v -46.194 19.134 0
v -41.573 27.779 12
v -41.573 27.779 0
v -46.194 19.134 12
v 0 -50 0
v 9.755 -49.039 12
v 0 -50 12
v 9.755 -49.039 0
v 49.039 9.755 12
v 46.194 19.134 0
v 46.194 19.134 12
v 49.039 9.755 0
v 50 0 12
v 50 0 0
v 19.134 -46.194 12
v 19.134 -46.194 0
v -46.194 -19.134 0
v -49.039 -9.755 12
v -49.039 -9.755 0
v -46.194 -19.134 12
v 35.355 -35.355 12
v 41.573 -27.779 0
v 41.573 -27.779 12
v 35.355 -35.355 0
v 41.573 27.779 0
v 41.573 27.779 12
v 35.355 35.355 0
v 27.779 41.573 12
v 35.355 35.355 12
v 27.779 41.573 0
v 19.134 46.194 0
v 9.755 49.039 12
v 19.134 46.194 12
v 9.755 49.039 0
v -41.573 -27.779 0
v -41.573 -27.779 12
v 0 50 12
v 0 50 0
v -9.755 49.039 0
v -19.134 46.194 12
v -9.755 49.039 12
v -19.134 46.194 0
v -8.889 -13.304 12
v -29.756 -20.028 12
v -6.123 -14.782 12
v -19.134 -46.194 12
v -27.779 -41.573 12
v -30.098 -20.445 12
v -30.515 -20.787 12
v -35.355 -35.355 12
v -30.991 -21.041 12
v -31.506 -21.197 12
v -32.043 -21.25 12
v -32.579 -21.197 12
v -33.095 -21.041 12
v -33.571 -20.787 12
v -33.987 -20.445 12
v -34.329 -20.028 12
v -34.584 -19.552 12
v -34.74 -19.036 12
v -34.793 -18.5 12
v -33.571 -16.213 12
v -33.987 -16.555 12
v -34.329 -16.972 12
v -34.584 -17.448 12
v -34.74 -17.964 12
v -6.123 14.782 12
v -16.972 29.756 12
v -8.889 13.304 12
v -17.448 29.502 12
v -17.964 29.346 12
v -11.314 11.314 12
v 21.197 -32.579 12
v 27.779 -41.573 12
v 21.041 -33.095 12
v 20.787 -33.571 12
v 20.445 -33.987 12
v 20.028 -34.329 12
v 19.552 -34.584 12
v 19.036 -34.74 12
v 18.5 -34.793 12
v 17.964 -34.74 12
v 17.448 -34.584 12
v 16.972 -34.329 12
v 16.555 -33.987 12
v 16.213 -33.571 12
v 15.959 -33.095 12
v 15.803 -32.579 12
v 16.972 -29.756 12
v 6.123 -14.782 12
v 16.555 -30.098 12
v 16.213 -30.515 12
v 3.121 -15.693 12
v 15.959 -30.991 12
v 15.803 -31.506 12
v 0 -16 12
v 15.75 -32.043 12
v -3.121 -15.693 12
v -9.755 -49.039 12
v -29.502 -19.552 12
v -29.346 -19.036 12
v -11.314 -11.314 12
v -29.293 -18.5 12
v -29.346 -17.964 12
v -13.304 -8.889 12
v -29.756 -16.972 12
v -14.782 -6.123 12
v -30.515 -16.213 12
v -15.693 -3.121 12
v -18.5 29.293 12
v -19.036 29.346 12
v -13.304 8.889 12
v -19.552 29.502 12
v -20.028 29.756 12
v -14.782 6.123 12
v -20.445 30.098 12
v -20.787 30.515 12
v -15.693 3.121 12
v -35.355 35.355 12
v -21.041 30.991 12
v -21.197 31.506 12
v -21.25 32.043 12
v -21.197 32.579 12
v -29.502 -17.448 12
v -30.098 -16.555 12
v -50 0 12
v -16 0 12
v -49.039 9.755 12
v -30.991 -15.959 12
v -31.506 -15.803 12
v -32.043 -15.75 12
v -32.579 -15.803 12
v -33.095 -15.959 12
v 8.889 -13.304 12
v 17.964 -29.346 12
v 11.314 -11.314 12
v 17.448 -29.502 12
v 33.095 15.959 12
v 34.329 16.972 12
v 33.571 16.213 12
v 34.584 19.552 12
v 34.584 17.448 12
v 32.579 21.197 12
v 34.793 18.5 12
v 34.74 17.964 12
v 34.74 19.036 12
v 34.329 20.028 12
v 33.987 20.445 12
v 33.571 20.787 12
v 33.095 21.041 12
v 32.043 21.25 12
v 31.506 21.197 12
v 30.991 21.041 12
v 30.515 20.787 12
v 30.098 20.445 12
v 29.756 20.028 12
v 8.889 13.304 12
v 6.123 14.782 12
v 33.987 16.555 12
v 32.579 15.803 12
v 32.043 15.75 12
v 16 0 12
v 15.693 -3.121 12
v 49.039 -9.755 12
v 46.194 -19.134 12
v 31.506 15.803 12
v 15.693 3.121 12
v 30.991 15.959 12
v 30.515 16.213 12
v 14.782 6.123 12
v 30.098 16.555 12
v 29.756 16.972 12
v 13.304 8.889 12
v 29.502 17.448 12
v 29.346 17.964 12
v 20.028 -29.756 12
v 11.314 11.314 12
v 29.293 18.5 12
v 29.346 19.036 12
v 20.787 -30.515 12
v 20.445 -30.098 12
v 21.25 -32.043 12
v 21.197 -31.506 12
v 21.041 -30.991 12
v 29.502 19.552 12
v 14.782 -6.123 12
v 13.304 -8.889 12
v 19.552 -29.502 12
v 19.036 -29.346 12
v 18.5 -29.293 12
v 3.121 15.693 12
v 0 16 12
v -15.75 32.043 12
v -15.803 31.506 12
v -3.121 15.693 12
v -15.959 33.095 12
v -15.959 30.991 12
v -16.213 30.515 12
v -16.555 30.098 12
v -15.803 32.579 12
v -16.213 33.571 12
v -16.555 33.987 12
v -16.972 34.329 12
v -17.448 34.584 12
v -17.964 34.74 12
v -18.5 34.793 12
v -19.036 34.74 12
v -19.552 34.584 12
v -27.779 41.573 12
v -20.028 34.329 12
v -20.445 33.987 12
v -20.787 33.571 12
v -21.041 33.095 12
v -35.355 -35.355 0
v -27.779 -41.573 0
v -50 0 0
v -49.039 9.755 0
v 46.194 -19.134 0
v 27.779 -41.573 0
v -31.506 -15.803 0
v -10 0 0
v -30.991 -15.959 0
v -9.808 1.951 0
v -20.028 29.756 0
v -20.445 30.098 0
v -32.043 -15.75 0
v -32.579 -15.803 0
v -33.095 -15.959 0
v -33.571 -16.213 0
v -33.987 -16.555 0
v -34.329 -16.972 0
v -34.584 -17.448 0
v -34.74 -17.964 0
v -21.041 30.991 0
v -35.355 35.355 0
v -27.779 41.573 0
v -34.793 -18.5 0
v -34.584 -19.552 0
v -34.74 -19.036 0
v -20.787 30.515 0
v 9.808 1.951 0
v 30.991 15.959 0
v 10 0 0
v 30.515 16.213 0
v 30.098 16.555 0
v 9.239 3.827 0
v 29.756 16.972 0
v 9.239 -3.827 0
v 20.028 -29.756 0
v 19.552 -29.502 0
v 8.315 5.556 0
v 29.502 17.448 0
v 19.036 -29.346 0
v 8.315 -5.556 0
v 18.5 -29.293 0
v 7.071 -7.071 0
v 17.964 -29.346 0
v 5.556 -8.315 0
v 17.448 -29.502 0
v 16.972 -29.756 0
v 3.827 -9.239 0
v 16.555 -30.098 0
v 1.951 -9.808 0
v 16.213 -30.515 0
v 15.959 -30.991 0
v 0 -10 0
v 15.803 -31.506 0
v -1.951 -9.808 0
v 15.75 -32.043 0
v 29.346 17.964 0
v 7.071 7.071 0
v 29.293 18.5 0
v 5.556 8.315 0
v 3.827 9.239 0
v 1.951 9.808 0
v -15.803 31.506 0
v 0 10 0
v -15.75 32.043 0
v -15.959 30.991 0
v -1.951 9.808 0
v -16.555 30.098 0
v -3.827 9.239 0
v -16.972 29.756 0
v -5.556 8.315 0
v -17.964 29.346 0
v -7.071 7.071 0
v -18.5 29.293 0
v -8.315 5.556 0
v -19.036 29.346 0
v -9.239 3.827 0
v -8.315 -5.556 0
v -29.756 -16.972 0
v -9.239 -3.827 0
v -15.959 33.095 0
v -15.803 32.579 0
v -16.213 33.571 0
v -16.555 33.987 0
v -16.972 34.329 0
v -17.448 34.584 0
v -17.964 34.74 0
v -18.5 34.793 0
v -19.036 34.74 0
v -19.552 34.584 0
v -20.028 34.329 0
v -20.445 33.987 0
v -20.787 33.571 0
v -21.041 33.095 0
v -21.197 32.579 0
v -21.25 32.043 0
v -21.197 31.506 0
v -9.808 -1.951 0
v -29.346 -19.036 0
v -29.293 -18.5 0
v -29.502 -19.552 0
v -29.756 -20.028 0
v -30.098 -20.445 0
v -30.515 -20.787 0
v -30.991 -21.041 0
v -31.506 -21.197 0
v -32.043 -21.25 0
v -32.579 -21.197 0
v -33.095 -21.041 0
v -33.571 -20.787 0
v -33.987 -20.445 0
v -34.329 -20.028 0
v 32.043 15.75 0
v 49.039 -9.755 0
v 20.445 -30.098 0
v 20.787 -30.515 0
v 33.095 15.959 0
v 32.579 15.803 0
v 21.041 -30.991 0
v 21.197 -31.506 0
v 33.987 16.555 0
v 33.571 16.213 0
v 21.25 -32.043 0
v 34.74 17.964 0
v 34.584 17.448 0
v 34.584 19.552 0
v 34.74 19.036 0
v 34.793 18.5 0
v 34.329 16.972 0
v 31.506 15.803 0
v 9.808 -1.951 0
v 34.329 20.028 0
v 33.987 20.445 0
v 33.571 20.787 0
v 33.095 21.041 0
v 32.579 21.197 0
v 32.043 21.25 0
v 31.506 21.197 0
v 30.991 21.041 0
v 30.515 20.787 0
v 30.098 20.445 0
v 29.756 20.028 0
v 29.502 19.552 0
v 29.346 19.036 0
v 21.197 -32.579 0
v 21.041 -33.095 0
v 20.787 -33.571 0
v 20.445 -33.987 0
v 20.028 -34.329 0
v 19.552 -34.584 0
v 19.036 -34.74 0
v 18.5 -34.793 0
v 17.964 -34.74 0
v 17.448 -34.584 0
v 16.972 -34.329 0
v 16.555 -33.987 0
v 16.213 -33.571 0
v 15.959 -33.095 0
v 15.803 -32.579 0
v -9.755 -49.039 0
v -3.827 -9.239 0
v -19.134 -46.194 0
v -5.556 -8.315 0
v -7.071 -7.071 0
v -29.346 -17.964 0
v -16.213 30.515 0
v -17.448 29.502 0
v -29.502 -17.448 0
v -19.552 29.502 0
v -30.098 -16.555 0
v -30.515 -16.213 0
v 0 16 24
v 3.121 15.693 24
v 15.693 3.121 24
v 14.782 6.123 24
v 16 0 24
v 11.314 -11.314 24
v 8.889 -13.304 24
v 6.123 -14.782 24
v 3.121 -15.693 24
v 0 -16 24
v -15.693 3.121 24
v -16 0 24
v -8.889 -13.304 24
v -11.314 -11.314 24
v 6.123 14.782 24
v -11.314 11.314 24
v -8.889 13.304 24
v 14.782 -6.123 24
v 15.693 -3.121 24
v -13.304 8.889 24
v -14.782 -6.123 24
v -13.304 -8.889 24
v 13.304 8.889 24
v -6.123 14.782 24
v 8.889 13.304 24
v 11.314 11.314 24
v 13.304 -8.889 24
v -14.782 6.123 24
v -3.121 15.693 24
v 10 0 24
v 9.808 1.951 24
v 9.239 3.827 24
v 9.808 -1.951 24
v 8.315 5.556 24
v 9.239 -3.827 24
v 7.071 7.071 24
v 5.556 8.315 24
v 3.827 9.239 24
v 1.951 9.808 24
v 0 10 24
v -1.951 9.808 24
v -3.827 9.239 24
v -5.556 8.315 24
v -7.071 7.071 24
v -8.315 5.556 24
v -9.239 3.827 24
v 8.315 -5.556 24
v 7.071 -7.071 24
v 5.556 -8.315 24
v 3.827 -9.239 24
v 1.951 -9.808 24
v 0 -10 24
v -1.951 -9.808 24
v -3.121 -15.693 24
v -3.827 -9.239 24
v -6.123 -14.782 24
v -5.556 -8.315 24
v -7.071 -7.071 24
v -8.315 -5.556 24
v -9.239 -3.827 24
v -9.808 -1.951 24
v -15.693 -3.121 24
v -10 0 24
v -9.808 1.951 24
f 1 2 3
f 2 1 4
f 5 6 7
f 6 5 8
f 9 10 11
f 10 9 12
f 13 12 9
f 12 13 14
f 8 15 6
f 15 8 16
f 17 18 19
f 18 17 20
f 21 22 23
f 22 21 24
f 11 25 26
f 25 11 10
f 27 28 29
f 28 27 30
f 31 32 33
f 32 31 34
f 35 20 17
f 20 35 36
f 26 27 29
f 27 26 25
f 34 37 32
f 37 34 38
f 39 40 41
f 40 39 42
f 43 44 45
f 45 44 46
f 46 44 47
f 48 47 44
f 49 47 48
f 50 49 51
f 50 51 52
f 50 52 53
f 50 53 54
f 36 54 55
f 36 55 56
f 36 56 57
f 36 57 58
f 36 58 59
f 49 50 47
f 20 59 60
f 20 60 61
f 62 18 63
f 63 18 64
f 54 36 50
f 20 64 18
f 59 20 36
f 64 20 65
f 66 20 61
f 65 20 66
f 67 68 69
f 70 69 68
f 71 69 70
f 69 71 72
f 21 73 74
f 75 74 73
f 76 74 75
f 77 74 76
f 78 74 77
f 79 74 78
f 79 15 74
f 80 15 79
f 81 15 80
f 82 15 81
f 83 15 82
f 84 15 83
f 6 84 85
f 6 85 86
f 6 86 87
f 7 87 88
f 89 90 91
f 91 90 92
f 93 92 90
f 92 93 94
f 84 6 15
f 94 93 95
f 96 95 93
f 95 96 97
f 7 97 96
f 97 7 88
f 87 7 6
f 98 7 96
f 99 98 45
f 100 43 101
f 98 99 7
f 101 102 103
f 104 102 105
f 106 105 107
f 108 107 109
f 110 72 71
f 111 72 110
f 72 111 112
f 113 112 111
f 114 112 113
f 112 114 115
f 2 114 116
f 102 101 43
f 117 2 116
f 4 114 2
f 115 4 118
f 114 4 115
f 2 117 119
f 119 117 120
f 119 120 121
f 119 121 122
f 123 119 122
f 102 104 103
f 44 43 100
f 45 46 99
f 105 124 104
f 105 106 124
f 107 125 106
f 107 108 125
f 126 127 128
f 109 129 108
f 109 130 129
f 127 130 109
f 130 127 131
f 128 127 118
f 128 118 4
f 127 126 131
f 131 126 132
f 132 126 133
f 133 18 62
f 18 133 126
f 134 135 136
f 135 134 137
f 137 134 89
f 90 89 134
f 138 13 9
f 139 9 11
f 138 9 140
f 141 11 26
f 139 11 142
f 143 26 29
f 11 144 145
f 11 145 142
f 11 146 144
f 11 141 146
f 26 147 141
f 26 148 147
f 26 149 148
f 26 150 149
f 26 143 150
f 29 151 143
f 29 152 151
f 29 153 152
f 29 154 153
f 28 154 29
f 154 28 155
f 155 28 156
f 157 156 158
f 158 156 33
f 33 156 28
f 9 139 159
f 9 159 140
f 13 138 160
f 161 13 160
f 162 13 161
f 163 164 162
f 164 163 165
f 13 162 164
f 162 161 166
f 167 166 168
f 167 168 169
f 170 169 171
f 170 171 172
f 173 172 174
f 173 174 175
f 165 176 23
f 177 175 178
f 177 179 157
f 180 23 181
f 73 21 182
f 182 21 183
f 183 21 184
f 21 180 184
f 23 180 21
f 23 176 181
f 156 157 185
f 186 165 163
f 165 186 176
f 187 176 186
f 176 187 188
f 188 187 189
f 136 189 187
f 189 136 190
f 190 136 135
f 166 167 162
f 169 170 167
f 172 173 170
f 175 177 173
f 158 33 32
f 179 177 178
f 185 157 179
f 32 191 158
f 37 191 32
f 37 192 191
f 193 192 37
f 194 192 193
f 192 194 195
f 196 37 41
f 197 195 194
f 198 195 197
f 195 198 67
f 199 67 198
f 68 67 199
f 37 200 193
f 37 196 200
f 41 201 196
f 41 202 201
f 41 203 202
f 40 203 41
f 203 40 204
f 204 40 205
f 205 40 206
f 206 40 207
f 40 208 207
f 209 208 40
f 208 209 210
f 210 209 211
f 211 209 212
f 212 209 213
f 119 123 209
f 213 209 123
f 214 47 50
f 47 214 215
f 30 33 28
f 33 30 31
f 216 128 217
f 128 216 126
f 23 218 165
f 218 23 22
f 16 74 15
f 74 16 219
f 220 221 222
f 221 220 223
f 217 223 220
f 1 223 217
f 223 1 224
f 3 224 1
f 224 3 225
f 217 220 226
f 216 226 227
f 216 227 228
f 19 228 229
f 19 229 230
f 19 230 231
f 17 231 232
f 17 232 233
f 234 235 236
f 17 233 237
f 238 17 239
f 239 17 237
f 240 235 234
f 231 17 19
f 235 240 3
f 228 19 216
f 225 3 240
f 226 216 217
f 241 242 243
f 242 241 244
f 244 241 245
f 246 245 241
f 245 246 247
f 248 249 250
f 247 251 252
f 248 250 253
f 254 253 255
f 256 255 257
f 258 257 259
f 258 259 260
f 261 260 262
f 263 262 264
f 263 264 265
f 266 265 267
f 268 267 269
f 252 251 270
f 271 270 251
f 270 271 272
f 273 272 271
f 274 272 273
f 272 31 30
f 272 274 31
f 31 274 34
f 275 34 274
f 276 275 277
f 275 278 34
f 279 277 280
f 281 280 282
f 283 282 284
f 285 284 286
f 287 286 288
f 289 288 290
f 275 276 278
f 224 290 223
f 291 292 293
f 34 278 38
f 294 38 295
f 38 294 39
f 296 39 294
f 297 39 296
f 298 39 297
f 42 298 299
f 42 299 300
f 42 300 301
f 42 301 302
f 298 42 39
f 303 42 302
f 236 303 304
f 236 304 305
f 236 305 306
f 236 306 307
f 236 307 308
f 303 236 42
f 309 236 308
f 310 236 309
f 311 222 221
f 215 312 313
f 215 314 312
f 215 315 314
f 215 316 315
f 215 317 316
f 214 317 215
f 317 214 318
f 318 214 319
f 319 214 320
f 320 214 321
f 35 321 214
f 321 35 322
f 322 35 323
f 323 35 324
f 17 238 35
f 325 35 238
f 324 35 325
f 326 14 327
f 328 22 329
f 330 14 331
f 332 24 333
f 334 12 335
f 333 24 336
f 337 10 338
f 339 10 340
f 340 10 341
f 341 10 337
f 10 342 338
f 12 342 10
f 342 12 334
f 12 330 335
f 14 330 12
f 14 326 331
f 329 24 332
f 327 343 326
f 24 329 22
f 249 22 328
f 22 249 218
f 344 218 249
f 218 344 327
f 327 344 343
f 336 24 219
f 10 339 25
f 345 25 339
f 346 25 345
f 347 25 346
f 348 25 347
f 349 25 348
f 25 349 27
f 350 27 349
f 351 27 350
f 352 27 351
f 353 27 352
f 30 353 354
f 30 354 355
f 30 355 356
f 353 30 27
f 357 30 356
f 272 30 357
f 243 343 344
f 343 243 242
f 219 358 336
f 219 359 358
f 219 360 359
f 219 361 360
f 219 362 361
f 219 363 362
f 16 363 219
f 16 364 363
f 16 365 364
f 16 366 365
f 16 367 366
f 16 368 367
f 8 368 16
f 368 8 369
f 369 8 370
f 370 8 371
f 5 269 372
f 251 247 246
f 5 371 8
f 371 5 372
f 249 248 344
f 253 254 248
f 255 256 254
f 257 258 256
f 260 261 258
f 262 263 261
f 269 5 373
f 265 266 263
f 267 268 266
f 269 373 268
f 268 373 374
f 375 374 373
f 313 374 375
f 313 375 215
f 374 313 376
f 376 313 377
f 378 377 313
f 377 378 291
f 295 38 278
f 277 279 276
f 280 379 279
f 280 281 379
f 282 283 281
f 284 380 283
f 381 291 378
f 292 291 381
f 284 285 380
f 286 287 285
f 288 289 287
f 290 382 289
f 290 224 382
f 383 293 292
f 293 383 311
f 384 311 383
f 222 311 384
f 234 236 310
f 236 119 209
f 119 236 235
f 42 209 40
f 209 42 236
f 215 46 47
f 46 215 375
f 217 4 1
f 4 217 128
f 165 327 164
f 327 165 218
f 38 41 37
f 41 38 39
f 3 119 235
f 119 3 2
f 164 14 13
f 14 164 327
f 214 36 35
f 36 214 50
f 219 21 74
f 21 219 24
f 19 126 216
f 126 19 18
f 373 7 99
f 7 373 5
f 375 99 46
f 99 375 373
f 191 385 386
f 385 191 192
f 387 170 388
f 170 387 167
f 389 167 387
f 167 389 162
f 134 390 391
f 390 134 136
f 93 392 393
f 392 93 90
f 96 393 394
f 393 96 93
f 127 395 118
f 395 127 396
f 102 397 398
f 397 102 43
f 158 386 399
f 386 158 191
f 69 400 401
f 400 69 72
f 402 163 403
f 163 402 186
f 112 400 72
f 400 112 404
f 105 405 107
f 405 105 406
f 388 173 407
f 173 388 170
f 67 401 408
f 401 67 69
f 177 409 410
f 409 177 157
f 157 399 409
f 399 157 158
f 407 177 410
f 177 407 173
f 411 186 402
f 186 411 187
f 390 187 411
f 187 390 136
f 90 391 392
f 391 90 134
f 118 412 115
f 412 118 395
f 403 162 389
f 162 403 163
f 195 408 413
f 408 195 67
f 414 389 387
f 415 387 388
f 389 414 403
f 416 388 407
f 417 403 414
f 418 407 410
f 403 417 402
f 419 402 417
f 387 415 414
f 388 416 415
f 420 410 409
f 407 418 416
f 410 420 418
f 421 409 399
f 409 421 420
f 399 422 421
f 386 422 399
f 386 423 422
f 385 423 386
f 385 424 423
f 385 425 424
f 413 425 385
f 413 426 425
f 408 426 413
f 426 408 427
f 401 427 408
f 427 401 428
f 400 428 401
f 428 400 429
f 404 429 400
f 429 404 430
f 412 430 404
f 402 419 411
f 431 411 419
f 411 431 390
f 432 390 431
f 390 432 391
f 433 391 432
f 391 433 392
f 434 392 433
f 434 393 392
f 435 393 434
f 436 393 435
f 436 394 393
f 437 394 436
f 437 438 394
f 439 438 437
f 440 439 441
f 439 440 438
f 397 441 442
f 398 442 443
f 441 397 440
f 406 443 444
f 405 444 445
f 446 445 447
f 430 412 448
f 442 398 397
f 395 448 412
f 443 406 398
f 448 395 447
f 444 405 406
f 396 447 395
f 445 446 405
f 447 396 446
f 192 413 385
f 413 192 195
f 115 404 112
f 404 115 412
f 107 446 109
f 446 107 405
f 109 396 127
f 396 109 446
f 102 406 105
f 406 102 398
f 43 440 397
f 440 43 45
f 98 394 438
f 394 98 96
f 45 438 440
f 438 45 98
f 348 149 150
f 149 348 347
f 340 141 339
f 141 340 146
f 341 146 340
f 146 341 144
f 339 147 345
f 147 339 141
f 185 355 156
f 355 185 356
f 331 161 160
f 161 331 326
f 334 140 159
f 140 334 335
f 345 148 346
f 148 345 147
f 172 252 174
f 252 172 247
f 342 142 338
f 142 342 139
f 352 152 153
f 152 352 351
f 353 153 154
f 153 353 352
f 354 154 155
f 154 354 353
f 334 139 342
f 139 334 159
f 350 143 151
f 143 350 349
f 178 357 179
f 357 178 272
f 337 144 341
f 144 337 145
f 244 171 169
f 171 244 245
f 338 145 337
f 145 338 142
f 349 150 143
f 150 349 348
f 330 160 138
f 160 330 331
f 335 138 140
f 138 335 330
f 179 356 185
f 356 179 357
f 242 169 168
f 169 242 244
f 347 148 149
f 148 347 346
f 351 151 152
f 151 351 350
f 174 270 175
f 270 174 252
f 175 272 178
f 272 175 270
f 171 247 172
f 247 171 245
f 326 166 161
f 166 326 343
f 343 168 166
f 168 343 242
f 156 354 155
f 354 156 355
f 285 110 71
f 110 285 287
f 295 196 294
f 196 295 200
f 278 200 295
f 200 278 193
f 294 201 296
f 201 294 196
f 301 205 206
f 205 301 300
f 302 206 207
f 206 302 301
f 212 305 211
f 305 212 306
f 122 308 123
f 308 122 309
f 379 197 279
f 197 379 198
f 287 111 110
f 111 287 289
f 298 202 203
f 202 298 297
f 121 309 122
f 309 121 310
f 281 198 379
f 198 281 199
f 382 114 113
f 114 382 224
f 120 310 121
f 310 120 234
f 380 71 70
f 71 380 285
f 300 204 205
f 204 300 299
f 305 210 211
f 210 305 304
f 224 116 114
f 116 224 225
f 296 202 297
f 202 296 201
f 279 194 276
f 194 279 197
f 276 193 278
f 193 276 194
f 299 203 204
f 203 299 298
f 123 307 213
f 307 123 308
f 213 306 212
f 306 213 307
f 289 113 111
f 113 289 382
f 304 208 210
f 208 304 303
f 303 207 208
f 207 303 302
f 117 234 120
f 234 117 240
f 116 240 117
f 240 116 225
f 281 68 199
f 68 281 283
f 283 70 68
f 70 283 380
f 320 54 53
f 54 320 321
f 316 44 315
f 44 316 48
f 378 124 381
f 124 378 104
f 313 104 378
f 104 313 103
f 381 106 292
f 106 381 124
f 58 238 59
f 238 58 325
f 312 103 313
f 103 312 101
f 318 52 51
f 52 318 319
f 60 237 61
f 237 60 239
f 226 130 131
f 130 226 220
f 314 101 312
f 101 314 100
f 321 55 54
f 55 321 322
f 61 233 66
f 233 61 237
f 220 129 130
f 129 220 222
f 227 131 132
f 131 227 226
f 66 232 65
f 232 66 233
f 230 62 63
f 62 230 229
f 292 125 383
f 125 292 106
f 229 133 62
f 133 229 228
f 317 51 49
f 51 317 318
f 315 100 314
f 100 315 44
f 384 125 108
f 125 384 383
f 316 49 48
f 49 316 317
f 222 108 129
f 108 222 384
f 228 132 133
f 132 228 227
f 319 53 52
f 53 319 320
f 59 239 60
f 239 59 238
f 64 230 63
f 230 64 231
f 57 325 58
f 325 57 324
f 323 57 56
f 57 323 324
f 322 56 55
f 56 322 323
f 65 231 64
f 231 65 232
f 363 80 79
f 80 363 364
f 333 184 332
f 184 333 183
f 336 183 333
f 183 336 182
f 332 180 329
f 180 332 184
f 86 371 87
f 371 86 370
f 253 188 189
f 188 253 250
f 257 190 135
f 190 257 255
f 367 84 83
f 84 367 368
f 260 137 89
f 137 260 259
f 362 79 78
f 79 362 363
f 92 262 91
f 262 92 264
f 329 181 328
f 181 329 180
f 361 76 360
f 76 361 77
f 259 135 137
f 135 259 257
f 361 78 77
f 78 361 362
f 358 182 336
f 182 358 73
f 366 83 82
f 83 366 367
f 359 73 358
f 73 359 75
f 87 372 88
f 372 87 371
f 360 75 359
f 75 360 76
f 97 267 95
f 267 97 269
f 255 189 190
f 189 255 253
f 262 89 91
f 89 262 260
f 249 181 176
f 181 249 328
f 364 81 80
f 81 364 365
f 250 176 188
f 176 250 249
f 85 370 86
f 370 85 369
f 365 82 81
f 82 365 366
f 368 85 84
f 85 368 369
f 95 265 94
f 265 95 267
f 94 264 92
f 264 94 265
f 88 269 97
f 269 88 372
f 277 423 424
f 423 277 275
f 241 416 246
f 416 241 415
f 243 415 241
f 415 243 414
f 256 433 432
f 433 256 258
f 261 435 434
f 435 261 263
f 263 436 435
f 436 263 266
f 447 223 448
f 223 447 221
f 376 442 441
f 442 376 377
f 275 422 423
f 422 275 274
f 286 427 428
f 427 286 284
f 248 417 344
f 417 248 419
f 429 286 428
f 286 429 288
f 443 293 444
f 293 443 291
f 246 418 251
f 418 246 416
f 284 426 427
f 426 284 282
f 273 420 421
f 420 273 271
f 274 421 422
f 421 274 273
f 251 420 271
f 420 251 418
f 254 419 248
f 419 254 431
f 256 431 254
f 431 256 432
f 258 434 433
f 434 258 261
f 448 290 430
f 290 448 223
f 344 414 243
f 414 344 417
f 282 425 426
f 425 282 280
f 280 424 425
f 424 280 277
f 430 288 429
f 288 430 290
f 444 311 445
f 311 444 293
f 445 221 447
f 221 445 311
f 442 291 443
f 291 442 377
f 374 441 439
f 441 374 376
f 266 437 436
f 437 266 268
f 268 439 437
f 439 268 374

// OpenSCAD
$fn = 32;

// ----------------------------------------------------------------------
// Flange Ø100 x 12
// 4 holes on a Ø74 bolt circle, bolted joints
// ----------------------------------------------------------------------

// --- parameters (mm) ---
flange_d = 100;  // outside diameter of the flange
thickness = 12;  // flange thickness
holes = 4;       // number of bolt holes
pcd = 74;        // bolt circle diameter
start_deg = 30;  // angle of the first hole, from +X
hole_d = 5.5;    // bolt hole diameter
bore_d = 20;     // central through bore
hub_d = 32;      // hub outside diameter
hub_h = 12;      // hub height above the flange face (0 = no hub)

// --- derived feature positions (mm) ---
height = thickness + hub_h;  // = 24   overall height of the part
pcd_r = pcd / 2;             // = 37   bolt circle radius
hole_step = 360 / holes;     // = 90   angular pitch
feature_centers = [
  [pcd_r * cos(start_deg + 0 * hole_step), pcd_r * sin(start_deg + 0 * hole_step)],
  [pcd_r * cos(start_deg + 1 * hole_step), pcd_r * sin(start_deg + 1 * hole_step)],
  [pcd_r * cos(start_deg + 2 * hole_step), pcd_r * sin(start_deg + 2 * hole_step)],
  [pcd_r * cos(start_deg + 3 * hole_step), pcd_r * sin(start_deg + 3 * hole_step)]
];   // bolt hole centres on the pitch circle

// flange disc, every hole and the bore cut straight through
difference() {
  union() {
    cylinder(d = flange_d, h = thickness);
    cylinder(d = hub_d, h = height);  // hub, overlapped into the flange
  }
  translate([0, 0, -1]) cylinder(d = bore_d, h = height + 2);  // bore, through
  for (centre = feature_centers)
    translate([centre[0], centre[1], -1]) cylinder(d = hole_d, h = thickness + 2);
}
